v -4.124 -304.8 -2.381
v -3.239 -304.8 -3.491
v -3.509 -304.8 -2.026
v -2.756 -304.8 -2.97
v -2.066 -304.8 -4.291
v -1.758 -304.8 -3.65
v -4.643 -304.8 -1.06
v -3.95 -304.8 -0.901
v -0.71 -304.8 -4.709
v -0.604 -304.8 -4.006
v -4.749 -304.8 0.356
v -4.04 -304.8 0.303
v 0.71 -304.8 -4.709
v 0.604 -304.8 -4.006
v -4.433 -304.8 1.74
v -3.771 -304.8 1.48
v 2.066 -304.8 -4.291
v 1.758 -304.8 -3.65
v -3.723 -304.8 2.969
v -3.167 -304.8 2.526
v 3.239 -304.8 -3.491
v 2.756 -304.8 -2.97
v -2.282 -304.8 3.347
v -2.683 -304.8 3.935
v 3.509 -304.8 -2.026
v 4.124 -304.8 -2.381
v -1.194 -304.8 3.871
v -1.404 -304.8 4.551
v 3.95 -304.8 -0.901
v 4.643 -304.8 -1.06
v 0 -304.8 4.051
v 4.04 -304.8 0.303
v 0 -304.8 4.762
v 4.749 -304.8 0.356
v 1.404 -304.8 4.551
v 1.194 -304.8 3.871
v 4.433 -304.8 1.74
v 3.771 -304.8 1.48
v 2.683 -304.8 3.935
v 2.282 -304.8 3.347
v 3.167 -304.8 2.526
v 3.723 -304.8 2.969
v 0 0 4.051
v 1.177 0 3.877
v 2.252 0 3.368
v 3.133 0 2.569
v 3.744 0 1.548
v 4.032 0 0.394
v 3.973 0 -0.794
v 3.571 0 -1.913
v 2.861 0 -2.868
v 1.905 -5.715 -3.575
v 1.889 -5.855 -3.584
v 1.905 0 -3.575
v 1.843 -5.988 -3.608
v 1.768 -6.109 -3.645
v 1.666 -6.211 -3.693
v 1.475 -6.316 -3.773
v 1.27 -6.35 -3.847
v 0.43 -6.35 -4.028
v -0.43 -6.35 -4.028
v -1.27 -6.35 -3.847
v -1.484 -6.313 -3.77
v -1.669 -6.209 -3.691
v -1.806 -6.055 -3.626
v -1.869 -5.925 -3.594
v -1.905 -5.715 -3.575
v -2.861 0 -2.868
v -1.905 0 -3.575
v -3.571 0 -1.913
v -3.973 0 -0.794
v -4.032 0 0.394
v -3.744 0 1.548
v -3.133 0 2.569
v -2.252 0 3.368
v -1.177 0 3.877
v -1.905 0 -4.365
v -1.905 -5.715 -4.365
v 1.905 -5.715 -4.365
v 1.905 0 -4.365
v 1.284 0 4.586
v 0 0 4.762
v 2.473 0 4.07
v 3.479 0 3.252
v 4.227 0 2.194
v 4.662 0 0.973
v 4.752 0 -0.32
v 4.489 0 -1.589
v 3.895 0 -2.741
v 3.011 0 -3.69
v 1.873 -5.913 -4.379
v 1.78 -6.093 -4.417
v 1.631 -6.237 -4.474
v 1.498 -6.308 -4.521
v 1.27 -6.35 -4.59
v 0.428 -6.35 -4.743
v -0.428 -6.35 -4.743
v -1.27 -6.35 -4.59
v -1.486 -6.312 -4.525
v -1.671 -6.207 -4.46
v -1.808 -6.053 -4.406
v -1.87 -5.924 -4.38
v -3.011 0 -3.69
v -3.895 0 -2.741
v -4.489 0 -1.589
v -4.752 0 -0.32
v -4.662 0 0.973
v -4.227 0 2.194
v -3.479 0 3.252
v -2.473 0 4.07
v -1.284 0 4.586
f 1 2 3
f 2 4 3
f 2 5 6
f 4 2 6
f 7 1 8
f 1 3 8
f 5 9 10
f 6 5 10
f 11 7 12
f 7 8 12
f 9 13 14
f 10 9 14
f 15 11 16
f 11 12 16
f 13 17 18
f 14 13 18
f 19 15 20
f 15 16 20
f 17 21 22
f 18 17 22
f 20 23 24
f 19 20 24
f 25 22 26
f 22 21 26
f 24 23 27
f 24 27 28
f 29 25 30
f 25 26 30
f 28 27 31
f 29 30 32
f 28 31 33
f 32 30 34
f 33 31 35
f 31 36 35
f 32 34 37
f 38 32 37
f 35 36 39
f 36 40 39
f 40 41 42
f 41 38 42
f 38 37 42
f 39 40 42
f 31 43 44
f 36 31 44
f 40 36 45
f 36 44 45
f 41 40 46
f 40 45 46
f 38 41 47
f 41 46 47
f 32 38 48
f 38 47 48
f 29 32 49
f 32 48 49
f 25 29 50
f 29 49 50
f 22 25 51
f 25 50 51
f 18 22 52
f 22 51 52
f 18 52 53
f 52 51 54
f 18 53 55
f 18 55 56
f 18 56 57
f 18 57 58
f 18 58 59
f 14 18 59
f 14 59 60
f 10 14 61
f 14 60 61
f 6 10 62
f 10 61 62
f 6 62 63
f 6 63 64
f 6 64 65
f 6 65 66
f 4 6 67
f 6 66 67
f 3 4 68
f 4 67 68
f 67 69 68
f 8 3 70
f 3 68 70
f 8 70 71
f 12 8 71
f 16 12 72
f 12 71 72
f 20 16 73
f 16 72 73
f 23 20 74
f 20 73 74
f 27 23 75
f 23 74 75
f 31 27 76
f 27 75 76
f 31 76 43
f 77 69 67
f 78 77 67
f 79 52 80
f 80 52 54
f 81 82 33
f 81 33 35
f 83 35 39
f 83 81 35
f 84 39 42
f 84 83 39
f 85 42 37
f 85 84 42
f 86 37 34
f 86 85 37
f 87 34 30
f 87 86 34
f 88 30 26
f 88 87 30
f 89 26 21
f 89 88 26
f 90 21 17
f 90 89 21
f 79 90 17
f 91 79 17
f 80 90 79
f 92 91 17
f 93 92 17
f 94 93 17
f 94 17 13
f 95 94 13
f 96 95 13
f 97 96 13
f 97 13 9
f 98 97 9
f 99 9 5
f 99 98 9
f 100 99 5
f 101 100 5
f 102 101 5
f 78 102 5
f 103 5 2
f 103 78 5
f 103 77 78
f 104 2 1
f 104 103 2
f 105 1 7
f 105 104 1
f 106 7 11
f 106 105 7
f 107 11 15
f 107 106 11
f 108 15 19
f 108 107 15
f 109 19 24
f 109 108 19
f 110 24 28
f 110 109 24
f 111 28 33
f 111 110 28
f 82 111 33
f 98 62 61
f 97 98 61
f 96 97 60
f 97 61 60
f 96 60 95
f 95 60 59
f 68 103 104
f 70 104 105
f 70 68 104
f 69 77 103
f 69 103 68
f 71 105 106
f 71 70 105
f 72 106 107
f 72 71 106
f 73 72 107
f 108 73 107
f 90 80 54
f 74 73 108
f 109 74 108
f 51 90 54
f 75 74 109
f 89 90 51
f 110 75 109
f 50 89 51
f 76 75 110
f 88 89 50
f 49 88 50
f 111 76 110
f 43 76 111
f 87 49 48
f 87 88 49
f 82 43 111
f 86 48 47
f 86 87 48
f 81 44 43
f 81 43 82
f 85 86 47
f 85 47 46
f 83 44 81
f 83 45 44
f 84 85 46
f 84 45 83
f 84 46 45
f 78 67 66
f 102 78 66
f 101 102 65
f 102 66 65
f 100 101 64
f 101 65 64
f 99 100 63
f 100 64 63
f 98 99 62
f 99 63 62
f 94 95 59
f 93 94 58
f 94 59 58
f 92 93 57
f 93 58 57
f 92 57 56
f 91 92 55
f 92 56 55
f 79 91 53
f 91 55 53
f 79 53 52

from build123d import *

# Parameters (mm, degrees)
SKETCH1_R     = 4.7625
SKETCH1_R_2   = 4.0513
SHAFT_DEPTH   = 304.8
CUTAWAY_DEPTH = 305.874404981


with BuildPart() as part:
    # Sketch1 → Shaft (new body)
    with BuildSketch(Plane(origin=(0, 0, 0), x_dir=(1, 0, 0), z_dir=(0, 1, 0))):
        with Locations(Location((0, 0, 0), (0, 0, 270))):
            Circle(SKETCH1_R)
        with Locations(Location((0, 0, 0), (0, 0, 270))):
            Circle(SKETCH1_R_2, mode=Mode.SUBTRACT)
    extrude(amount=-SHAFT_DEPTH)

    # Sketch2 → Cutaway (cut, through all)
    with BuildSketch(Plane.XY):
        with BuildLine():
            Line((-1.27, -6.35), (1.27, -6.35))
            ThreePointArc((1.27, -6.35), (1.719012806, -6.164012806), (1.905, -5.715))
            Line((1.905, -5.715), (1.905, 0))
            Line((1.905, 0), (-1.905, 0))
            Line((-1.905, 0), (-1.905, -5.715))
            ThreePointArc((-1.905, -5.715), (-1.719012806, -6.164012806), (-1.27, -6.35))
        make_face()
    extrude(amount=-CUTAWAY_DEPTH, mode=Mode.SUBTRACT)


solid = part.part
